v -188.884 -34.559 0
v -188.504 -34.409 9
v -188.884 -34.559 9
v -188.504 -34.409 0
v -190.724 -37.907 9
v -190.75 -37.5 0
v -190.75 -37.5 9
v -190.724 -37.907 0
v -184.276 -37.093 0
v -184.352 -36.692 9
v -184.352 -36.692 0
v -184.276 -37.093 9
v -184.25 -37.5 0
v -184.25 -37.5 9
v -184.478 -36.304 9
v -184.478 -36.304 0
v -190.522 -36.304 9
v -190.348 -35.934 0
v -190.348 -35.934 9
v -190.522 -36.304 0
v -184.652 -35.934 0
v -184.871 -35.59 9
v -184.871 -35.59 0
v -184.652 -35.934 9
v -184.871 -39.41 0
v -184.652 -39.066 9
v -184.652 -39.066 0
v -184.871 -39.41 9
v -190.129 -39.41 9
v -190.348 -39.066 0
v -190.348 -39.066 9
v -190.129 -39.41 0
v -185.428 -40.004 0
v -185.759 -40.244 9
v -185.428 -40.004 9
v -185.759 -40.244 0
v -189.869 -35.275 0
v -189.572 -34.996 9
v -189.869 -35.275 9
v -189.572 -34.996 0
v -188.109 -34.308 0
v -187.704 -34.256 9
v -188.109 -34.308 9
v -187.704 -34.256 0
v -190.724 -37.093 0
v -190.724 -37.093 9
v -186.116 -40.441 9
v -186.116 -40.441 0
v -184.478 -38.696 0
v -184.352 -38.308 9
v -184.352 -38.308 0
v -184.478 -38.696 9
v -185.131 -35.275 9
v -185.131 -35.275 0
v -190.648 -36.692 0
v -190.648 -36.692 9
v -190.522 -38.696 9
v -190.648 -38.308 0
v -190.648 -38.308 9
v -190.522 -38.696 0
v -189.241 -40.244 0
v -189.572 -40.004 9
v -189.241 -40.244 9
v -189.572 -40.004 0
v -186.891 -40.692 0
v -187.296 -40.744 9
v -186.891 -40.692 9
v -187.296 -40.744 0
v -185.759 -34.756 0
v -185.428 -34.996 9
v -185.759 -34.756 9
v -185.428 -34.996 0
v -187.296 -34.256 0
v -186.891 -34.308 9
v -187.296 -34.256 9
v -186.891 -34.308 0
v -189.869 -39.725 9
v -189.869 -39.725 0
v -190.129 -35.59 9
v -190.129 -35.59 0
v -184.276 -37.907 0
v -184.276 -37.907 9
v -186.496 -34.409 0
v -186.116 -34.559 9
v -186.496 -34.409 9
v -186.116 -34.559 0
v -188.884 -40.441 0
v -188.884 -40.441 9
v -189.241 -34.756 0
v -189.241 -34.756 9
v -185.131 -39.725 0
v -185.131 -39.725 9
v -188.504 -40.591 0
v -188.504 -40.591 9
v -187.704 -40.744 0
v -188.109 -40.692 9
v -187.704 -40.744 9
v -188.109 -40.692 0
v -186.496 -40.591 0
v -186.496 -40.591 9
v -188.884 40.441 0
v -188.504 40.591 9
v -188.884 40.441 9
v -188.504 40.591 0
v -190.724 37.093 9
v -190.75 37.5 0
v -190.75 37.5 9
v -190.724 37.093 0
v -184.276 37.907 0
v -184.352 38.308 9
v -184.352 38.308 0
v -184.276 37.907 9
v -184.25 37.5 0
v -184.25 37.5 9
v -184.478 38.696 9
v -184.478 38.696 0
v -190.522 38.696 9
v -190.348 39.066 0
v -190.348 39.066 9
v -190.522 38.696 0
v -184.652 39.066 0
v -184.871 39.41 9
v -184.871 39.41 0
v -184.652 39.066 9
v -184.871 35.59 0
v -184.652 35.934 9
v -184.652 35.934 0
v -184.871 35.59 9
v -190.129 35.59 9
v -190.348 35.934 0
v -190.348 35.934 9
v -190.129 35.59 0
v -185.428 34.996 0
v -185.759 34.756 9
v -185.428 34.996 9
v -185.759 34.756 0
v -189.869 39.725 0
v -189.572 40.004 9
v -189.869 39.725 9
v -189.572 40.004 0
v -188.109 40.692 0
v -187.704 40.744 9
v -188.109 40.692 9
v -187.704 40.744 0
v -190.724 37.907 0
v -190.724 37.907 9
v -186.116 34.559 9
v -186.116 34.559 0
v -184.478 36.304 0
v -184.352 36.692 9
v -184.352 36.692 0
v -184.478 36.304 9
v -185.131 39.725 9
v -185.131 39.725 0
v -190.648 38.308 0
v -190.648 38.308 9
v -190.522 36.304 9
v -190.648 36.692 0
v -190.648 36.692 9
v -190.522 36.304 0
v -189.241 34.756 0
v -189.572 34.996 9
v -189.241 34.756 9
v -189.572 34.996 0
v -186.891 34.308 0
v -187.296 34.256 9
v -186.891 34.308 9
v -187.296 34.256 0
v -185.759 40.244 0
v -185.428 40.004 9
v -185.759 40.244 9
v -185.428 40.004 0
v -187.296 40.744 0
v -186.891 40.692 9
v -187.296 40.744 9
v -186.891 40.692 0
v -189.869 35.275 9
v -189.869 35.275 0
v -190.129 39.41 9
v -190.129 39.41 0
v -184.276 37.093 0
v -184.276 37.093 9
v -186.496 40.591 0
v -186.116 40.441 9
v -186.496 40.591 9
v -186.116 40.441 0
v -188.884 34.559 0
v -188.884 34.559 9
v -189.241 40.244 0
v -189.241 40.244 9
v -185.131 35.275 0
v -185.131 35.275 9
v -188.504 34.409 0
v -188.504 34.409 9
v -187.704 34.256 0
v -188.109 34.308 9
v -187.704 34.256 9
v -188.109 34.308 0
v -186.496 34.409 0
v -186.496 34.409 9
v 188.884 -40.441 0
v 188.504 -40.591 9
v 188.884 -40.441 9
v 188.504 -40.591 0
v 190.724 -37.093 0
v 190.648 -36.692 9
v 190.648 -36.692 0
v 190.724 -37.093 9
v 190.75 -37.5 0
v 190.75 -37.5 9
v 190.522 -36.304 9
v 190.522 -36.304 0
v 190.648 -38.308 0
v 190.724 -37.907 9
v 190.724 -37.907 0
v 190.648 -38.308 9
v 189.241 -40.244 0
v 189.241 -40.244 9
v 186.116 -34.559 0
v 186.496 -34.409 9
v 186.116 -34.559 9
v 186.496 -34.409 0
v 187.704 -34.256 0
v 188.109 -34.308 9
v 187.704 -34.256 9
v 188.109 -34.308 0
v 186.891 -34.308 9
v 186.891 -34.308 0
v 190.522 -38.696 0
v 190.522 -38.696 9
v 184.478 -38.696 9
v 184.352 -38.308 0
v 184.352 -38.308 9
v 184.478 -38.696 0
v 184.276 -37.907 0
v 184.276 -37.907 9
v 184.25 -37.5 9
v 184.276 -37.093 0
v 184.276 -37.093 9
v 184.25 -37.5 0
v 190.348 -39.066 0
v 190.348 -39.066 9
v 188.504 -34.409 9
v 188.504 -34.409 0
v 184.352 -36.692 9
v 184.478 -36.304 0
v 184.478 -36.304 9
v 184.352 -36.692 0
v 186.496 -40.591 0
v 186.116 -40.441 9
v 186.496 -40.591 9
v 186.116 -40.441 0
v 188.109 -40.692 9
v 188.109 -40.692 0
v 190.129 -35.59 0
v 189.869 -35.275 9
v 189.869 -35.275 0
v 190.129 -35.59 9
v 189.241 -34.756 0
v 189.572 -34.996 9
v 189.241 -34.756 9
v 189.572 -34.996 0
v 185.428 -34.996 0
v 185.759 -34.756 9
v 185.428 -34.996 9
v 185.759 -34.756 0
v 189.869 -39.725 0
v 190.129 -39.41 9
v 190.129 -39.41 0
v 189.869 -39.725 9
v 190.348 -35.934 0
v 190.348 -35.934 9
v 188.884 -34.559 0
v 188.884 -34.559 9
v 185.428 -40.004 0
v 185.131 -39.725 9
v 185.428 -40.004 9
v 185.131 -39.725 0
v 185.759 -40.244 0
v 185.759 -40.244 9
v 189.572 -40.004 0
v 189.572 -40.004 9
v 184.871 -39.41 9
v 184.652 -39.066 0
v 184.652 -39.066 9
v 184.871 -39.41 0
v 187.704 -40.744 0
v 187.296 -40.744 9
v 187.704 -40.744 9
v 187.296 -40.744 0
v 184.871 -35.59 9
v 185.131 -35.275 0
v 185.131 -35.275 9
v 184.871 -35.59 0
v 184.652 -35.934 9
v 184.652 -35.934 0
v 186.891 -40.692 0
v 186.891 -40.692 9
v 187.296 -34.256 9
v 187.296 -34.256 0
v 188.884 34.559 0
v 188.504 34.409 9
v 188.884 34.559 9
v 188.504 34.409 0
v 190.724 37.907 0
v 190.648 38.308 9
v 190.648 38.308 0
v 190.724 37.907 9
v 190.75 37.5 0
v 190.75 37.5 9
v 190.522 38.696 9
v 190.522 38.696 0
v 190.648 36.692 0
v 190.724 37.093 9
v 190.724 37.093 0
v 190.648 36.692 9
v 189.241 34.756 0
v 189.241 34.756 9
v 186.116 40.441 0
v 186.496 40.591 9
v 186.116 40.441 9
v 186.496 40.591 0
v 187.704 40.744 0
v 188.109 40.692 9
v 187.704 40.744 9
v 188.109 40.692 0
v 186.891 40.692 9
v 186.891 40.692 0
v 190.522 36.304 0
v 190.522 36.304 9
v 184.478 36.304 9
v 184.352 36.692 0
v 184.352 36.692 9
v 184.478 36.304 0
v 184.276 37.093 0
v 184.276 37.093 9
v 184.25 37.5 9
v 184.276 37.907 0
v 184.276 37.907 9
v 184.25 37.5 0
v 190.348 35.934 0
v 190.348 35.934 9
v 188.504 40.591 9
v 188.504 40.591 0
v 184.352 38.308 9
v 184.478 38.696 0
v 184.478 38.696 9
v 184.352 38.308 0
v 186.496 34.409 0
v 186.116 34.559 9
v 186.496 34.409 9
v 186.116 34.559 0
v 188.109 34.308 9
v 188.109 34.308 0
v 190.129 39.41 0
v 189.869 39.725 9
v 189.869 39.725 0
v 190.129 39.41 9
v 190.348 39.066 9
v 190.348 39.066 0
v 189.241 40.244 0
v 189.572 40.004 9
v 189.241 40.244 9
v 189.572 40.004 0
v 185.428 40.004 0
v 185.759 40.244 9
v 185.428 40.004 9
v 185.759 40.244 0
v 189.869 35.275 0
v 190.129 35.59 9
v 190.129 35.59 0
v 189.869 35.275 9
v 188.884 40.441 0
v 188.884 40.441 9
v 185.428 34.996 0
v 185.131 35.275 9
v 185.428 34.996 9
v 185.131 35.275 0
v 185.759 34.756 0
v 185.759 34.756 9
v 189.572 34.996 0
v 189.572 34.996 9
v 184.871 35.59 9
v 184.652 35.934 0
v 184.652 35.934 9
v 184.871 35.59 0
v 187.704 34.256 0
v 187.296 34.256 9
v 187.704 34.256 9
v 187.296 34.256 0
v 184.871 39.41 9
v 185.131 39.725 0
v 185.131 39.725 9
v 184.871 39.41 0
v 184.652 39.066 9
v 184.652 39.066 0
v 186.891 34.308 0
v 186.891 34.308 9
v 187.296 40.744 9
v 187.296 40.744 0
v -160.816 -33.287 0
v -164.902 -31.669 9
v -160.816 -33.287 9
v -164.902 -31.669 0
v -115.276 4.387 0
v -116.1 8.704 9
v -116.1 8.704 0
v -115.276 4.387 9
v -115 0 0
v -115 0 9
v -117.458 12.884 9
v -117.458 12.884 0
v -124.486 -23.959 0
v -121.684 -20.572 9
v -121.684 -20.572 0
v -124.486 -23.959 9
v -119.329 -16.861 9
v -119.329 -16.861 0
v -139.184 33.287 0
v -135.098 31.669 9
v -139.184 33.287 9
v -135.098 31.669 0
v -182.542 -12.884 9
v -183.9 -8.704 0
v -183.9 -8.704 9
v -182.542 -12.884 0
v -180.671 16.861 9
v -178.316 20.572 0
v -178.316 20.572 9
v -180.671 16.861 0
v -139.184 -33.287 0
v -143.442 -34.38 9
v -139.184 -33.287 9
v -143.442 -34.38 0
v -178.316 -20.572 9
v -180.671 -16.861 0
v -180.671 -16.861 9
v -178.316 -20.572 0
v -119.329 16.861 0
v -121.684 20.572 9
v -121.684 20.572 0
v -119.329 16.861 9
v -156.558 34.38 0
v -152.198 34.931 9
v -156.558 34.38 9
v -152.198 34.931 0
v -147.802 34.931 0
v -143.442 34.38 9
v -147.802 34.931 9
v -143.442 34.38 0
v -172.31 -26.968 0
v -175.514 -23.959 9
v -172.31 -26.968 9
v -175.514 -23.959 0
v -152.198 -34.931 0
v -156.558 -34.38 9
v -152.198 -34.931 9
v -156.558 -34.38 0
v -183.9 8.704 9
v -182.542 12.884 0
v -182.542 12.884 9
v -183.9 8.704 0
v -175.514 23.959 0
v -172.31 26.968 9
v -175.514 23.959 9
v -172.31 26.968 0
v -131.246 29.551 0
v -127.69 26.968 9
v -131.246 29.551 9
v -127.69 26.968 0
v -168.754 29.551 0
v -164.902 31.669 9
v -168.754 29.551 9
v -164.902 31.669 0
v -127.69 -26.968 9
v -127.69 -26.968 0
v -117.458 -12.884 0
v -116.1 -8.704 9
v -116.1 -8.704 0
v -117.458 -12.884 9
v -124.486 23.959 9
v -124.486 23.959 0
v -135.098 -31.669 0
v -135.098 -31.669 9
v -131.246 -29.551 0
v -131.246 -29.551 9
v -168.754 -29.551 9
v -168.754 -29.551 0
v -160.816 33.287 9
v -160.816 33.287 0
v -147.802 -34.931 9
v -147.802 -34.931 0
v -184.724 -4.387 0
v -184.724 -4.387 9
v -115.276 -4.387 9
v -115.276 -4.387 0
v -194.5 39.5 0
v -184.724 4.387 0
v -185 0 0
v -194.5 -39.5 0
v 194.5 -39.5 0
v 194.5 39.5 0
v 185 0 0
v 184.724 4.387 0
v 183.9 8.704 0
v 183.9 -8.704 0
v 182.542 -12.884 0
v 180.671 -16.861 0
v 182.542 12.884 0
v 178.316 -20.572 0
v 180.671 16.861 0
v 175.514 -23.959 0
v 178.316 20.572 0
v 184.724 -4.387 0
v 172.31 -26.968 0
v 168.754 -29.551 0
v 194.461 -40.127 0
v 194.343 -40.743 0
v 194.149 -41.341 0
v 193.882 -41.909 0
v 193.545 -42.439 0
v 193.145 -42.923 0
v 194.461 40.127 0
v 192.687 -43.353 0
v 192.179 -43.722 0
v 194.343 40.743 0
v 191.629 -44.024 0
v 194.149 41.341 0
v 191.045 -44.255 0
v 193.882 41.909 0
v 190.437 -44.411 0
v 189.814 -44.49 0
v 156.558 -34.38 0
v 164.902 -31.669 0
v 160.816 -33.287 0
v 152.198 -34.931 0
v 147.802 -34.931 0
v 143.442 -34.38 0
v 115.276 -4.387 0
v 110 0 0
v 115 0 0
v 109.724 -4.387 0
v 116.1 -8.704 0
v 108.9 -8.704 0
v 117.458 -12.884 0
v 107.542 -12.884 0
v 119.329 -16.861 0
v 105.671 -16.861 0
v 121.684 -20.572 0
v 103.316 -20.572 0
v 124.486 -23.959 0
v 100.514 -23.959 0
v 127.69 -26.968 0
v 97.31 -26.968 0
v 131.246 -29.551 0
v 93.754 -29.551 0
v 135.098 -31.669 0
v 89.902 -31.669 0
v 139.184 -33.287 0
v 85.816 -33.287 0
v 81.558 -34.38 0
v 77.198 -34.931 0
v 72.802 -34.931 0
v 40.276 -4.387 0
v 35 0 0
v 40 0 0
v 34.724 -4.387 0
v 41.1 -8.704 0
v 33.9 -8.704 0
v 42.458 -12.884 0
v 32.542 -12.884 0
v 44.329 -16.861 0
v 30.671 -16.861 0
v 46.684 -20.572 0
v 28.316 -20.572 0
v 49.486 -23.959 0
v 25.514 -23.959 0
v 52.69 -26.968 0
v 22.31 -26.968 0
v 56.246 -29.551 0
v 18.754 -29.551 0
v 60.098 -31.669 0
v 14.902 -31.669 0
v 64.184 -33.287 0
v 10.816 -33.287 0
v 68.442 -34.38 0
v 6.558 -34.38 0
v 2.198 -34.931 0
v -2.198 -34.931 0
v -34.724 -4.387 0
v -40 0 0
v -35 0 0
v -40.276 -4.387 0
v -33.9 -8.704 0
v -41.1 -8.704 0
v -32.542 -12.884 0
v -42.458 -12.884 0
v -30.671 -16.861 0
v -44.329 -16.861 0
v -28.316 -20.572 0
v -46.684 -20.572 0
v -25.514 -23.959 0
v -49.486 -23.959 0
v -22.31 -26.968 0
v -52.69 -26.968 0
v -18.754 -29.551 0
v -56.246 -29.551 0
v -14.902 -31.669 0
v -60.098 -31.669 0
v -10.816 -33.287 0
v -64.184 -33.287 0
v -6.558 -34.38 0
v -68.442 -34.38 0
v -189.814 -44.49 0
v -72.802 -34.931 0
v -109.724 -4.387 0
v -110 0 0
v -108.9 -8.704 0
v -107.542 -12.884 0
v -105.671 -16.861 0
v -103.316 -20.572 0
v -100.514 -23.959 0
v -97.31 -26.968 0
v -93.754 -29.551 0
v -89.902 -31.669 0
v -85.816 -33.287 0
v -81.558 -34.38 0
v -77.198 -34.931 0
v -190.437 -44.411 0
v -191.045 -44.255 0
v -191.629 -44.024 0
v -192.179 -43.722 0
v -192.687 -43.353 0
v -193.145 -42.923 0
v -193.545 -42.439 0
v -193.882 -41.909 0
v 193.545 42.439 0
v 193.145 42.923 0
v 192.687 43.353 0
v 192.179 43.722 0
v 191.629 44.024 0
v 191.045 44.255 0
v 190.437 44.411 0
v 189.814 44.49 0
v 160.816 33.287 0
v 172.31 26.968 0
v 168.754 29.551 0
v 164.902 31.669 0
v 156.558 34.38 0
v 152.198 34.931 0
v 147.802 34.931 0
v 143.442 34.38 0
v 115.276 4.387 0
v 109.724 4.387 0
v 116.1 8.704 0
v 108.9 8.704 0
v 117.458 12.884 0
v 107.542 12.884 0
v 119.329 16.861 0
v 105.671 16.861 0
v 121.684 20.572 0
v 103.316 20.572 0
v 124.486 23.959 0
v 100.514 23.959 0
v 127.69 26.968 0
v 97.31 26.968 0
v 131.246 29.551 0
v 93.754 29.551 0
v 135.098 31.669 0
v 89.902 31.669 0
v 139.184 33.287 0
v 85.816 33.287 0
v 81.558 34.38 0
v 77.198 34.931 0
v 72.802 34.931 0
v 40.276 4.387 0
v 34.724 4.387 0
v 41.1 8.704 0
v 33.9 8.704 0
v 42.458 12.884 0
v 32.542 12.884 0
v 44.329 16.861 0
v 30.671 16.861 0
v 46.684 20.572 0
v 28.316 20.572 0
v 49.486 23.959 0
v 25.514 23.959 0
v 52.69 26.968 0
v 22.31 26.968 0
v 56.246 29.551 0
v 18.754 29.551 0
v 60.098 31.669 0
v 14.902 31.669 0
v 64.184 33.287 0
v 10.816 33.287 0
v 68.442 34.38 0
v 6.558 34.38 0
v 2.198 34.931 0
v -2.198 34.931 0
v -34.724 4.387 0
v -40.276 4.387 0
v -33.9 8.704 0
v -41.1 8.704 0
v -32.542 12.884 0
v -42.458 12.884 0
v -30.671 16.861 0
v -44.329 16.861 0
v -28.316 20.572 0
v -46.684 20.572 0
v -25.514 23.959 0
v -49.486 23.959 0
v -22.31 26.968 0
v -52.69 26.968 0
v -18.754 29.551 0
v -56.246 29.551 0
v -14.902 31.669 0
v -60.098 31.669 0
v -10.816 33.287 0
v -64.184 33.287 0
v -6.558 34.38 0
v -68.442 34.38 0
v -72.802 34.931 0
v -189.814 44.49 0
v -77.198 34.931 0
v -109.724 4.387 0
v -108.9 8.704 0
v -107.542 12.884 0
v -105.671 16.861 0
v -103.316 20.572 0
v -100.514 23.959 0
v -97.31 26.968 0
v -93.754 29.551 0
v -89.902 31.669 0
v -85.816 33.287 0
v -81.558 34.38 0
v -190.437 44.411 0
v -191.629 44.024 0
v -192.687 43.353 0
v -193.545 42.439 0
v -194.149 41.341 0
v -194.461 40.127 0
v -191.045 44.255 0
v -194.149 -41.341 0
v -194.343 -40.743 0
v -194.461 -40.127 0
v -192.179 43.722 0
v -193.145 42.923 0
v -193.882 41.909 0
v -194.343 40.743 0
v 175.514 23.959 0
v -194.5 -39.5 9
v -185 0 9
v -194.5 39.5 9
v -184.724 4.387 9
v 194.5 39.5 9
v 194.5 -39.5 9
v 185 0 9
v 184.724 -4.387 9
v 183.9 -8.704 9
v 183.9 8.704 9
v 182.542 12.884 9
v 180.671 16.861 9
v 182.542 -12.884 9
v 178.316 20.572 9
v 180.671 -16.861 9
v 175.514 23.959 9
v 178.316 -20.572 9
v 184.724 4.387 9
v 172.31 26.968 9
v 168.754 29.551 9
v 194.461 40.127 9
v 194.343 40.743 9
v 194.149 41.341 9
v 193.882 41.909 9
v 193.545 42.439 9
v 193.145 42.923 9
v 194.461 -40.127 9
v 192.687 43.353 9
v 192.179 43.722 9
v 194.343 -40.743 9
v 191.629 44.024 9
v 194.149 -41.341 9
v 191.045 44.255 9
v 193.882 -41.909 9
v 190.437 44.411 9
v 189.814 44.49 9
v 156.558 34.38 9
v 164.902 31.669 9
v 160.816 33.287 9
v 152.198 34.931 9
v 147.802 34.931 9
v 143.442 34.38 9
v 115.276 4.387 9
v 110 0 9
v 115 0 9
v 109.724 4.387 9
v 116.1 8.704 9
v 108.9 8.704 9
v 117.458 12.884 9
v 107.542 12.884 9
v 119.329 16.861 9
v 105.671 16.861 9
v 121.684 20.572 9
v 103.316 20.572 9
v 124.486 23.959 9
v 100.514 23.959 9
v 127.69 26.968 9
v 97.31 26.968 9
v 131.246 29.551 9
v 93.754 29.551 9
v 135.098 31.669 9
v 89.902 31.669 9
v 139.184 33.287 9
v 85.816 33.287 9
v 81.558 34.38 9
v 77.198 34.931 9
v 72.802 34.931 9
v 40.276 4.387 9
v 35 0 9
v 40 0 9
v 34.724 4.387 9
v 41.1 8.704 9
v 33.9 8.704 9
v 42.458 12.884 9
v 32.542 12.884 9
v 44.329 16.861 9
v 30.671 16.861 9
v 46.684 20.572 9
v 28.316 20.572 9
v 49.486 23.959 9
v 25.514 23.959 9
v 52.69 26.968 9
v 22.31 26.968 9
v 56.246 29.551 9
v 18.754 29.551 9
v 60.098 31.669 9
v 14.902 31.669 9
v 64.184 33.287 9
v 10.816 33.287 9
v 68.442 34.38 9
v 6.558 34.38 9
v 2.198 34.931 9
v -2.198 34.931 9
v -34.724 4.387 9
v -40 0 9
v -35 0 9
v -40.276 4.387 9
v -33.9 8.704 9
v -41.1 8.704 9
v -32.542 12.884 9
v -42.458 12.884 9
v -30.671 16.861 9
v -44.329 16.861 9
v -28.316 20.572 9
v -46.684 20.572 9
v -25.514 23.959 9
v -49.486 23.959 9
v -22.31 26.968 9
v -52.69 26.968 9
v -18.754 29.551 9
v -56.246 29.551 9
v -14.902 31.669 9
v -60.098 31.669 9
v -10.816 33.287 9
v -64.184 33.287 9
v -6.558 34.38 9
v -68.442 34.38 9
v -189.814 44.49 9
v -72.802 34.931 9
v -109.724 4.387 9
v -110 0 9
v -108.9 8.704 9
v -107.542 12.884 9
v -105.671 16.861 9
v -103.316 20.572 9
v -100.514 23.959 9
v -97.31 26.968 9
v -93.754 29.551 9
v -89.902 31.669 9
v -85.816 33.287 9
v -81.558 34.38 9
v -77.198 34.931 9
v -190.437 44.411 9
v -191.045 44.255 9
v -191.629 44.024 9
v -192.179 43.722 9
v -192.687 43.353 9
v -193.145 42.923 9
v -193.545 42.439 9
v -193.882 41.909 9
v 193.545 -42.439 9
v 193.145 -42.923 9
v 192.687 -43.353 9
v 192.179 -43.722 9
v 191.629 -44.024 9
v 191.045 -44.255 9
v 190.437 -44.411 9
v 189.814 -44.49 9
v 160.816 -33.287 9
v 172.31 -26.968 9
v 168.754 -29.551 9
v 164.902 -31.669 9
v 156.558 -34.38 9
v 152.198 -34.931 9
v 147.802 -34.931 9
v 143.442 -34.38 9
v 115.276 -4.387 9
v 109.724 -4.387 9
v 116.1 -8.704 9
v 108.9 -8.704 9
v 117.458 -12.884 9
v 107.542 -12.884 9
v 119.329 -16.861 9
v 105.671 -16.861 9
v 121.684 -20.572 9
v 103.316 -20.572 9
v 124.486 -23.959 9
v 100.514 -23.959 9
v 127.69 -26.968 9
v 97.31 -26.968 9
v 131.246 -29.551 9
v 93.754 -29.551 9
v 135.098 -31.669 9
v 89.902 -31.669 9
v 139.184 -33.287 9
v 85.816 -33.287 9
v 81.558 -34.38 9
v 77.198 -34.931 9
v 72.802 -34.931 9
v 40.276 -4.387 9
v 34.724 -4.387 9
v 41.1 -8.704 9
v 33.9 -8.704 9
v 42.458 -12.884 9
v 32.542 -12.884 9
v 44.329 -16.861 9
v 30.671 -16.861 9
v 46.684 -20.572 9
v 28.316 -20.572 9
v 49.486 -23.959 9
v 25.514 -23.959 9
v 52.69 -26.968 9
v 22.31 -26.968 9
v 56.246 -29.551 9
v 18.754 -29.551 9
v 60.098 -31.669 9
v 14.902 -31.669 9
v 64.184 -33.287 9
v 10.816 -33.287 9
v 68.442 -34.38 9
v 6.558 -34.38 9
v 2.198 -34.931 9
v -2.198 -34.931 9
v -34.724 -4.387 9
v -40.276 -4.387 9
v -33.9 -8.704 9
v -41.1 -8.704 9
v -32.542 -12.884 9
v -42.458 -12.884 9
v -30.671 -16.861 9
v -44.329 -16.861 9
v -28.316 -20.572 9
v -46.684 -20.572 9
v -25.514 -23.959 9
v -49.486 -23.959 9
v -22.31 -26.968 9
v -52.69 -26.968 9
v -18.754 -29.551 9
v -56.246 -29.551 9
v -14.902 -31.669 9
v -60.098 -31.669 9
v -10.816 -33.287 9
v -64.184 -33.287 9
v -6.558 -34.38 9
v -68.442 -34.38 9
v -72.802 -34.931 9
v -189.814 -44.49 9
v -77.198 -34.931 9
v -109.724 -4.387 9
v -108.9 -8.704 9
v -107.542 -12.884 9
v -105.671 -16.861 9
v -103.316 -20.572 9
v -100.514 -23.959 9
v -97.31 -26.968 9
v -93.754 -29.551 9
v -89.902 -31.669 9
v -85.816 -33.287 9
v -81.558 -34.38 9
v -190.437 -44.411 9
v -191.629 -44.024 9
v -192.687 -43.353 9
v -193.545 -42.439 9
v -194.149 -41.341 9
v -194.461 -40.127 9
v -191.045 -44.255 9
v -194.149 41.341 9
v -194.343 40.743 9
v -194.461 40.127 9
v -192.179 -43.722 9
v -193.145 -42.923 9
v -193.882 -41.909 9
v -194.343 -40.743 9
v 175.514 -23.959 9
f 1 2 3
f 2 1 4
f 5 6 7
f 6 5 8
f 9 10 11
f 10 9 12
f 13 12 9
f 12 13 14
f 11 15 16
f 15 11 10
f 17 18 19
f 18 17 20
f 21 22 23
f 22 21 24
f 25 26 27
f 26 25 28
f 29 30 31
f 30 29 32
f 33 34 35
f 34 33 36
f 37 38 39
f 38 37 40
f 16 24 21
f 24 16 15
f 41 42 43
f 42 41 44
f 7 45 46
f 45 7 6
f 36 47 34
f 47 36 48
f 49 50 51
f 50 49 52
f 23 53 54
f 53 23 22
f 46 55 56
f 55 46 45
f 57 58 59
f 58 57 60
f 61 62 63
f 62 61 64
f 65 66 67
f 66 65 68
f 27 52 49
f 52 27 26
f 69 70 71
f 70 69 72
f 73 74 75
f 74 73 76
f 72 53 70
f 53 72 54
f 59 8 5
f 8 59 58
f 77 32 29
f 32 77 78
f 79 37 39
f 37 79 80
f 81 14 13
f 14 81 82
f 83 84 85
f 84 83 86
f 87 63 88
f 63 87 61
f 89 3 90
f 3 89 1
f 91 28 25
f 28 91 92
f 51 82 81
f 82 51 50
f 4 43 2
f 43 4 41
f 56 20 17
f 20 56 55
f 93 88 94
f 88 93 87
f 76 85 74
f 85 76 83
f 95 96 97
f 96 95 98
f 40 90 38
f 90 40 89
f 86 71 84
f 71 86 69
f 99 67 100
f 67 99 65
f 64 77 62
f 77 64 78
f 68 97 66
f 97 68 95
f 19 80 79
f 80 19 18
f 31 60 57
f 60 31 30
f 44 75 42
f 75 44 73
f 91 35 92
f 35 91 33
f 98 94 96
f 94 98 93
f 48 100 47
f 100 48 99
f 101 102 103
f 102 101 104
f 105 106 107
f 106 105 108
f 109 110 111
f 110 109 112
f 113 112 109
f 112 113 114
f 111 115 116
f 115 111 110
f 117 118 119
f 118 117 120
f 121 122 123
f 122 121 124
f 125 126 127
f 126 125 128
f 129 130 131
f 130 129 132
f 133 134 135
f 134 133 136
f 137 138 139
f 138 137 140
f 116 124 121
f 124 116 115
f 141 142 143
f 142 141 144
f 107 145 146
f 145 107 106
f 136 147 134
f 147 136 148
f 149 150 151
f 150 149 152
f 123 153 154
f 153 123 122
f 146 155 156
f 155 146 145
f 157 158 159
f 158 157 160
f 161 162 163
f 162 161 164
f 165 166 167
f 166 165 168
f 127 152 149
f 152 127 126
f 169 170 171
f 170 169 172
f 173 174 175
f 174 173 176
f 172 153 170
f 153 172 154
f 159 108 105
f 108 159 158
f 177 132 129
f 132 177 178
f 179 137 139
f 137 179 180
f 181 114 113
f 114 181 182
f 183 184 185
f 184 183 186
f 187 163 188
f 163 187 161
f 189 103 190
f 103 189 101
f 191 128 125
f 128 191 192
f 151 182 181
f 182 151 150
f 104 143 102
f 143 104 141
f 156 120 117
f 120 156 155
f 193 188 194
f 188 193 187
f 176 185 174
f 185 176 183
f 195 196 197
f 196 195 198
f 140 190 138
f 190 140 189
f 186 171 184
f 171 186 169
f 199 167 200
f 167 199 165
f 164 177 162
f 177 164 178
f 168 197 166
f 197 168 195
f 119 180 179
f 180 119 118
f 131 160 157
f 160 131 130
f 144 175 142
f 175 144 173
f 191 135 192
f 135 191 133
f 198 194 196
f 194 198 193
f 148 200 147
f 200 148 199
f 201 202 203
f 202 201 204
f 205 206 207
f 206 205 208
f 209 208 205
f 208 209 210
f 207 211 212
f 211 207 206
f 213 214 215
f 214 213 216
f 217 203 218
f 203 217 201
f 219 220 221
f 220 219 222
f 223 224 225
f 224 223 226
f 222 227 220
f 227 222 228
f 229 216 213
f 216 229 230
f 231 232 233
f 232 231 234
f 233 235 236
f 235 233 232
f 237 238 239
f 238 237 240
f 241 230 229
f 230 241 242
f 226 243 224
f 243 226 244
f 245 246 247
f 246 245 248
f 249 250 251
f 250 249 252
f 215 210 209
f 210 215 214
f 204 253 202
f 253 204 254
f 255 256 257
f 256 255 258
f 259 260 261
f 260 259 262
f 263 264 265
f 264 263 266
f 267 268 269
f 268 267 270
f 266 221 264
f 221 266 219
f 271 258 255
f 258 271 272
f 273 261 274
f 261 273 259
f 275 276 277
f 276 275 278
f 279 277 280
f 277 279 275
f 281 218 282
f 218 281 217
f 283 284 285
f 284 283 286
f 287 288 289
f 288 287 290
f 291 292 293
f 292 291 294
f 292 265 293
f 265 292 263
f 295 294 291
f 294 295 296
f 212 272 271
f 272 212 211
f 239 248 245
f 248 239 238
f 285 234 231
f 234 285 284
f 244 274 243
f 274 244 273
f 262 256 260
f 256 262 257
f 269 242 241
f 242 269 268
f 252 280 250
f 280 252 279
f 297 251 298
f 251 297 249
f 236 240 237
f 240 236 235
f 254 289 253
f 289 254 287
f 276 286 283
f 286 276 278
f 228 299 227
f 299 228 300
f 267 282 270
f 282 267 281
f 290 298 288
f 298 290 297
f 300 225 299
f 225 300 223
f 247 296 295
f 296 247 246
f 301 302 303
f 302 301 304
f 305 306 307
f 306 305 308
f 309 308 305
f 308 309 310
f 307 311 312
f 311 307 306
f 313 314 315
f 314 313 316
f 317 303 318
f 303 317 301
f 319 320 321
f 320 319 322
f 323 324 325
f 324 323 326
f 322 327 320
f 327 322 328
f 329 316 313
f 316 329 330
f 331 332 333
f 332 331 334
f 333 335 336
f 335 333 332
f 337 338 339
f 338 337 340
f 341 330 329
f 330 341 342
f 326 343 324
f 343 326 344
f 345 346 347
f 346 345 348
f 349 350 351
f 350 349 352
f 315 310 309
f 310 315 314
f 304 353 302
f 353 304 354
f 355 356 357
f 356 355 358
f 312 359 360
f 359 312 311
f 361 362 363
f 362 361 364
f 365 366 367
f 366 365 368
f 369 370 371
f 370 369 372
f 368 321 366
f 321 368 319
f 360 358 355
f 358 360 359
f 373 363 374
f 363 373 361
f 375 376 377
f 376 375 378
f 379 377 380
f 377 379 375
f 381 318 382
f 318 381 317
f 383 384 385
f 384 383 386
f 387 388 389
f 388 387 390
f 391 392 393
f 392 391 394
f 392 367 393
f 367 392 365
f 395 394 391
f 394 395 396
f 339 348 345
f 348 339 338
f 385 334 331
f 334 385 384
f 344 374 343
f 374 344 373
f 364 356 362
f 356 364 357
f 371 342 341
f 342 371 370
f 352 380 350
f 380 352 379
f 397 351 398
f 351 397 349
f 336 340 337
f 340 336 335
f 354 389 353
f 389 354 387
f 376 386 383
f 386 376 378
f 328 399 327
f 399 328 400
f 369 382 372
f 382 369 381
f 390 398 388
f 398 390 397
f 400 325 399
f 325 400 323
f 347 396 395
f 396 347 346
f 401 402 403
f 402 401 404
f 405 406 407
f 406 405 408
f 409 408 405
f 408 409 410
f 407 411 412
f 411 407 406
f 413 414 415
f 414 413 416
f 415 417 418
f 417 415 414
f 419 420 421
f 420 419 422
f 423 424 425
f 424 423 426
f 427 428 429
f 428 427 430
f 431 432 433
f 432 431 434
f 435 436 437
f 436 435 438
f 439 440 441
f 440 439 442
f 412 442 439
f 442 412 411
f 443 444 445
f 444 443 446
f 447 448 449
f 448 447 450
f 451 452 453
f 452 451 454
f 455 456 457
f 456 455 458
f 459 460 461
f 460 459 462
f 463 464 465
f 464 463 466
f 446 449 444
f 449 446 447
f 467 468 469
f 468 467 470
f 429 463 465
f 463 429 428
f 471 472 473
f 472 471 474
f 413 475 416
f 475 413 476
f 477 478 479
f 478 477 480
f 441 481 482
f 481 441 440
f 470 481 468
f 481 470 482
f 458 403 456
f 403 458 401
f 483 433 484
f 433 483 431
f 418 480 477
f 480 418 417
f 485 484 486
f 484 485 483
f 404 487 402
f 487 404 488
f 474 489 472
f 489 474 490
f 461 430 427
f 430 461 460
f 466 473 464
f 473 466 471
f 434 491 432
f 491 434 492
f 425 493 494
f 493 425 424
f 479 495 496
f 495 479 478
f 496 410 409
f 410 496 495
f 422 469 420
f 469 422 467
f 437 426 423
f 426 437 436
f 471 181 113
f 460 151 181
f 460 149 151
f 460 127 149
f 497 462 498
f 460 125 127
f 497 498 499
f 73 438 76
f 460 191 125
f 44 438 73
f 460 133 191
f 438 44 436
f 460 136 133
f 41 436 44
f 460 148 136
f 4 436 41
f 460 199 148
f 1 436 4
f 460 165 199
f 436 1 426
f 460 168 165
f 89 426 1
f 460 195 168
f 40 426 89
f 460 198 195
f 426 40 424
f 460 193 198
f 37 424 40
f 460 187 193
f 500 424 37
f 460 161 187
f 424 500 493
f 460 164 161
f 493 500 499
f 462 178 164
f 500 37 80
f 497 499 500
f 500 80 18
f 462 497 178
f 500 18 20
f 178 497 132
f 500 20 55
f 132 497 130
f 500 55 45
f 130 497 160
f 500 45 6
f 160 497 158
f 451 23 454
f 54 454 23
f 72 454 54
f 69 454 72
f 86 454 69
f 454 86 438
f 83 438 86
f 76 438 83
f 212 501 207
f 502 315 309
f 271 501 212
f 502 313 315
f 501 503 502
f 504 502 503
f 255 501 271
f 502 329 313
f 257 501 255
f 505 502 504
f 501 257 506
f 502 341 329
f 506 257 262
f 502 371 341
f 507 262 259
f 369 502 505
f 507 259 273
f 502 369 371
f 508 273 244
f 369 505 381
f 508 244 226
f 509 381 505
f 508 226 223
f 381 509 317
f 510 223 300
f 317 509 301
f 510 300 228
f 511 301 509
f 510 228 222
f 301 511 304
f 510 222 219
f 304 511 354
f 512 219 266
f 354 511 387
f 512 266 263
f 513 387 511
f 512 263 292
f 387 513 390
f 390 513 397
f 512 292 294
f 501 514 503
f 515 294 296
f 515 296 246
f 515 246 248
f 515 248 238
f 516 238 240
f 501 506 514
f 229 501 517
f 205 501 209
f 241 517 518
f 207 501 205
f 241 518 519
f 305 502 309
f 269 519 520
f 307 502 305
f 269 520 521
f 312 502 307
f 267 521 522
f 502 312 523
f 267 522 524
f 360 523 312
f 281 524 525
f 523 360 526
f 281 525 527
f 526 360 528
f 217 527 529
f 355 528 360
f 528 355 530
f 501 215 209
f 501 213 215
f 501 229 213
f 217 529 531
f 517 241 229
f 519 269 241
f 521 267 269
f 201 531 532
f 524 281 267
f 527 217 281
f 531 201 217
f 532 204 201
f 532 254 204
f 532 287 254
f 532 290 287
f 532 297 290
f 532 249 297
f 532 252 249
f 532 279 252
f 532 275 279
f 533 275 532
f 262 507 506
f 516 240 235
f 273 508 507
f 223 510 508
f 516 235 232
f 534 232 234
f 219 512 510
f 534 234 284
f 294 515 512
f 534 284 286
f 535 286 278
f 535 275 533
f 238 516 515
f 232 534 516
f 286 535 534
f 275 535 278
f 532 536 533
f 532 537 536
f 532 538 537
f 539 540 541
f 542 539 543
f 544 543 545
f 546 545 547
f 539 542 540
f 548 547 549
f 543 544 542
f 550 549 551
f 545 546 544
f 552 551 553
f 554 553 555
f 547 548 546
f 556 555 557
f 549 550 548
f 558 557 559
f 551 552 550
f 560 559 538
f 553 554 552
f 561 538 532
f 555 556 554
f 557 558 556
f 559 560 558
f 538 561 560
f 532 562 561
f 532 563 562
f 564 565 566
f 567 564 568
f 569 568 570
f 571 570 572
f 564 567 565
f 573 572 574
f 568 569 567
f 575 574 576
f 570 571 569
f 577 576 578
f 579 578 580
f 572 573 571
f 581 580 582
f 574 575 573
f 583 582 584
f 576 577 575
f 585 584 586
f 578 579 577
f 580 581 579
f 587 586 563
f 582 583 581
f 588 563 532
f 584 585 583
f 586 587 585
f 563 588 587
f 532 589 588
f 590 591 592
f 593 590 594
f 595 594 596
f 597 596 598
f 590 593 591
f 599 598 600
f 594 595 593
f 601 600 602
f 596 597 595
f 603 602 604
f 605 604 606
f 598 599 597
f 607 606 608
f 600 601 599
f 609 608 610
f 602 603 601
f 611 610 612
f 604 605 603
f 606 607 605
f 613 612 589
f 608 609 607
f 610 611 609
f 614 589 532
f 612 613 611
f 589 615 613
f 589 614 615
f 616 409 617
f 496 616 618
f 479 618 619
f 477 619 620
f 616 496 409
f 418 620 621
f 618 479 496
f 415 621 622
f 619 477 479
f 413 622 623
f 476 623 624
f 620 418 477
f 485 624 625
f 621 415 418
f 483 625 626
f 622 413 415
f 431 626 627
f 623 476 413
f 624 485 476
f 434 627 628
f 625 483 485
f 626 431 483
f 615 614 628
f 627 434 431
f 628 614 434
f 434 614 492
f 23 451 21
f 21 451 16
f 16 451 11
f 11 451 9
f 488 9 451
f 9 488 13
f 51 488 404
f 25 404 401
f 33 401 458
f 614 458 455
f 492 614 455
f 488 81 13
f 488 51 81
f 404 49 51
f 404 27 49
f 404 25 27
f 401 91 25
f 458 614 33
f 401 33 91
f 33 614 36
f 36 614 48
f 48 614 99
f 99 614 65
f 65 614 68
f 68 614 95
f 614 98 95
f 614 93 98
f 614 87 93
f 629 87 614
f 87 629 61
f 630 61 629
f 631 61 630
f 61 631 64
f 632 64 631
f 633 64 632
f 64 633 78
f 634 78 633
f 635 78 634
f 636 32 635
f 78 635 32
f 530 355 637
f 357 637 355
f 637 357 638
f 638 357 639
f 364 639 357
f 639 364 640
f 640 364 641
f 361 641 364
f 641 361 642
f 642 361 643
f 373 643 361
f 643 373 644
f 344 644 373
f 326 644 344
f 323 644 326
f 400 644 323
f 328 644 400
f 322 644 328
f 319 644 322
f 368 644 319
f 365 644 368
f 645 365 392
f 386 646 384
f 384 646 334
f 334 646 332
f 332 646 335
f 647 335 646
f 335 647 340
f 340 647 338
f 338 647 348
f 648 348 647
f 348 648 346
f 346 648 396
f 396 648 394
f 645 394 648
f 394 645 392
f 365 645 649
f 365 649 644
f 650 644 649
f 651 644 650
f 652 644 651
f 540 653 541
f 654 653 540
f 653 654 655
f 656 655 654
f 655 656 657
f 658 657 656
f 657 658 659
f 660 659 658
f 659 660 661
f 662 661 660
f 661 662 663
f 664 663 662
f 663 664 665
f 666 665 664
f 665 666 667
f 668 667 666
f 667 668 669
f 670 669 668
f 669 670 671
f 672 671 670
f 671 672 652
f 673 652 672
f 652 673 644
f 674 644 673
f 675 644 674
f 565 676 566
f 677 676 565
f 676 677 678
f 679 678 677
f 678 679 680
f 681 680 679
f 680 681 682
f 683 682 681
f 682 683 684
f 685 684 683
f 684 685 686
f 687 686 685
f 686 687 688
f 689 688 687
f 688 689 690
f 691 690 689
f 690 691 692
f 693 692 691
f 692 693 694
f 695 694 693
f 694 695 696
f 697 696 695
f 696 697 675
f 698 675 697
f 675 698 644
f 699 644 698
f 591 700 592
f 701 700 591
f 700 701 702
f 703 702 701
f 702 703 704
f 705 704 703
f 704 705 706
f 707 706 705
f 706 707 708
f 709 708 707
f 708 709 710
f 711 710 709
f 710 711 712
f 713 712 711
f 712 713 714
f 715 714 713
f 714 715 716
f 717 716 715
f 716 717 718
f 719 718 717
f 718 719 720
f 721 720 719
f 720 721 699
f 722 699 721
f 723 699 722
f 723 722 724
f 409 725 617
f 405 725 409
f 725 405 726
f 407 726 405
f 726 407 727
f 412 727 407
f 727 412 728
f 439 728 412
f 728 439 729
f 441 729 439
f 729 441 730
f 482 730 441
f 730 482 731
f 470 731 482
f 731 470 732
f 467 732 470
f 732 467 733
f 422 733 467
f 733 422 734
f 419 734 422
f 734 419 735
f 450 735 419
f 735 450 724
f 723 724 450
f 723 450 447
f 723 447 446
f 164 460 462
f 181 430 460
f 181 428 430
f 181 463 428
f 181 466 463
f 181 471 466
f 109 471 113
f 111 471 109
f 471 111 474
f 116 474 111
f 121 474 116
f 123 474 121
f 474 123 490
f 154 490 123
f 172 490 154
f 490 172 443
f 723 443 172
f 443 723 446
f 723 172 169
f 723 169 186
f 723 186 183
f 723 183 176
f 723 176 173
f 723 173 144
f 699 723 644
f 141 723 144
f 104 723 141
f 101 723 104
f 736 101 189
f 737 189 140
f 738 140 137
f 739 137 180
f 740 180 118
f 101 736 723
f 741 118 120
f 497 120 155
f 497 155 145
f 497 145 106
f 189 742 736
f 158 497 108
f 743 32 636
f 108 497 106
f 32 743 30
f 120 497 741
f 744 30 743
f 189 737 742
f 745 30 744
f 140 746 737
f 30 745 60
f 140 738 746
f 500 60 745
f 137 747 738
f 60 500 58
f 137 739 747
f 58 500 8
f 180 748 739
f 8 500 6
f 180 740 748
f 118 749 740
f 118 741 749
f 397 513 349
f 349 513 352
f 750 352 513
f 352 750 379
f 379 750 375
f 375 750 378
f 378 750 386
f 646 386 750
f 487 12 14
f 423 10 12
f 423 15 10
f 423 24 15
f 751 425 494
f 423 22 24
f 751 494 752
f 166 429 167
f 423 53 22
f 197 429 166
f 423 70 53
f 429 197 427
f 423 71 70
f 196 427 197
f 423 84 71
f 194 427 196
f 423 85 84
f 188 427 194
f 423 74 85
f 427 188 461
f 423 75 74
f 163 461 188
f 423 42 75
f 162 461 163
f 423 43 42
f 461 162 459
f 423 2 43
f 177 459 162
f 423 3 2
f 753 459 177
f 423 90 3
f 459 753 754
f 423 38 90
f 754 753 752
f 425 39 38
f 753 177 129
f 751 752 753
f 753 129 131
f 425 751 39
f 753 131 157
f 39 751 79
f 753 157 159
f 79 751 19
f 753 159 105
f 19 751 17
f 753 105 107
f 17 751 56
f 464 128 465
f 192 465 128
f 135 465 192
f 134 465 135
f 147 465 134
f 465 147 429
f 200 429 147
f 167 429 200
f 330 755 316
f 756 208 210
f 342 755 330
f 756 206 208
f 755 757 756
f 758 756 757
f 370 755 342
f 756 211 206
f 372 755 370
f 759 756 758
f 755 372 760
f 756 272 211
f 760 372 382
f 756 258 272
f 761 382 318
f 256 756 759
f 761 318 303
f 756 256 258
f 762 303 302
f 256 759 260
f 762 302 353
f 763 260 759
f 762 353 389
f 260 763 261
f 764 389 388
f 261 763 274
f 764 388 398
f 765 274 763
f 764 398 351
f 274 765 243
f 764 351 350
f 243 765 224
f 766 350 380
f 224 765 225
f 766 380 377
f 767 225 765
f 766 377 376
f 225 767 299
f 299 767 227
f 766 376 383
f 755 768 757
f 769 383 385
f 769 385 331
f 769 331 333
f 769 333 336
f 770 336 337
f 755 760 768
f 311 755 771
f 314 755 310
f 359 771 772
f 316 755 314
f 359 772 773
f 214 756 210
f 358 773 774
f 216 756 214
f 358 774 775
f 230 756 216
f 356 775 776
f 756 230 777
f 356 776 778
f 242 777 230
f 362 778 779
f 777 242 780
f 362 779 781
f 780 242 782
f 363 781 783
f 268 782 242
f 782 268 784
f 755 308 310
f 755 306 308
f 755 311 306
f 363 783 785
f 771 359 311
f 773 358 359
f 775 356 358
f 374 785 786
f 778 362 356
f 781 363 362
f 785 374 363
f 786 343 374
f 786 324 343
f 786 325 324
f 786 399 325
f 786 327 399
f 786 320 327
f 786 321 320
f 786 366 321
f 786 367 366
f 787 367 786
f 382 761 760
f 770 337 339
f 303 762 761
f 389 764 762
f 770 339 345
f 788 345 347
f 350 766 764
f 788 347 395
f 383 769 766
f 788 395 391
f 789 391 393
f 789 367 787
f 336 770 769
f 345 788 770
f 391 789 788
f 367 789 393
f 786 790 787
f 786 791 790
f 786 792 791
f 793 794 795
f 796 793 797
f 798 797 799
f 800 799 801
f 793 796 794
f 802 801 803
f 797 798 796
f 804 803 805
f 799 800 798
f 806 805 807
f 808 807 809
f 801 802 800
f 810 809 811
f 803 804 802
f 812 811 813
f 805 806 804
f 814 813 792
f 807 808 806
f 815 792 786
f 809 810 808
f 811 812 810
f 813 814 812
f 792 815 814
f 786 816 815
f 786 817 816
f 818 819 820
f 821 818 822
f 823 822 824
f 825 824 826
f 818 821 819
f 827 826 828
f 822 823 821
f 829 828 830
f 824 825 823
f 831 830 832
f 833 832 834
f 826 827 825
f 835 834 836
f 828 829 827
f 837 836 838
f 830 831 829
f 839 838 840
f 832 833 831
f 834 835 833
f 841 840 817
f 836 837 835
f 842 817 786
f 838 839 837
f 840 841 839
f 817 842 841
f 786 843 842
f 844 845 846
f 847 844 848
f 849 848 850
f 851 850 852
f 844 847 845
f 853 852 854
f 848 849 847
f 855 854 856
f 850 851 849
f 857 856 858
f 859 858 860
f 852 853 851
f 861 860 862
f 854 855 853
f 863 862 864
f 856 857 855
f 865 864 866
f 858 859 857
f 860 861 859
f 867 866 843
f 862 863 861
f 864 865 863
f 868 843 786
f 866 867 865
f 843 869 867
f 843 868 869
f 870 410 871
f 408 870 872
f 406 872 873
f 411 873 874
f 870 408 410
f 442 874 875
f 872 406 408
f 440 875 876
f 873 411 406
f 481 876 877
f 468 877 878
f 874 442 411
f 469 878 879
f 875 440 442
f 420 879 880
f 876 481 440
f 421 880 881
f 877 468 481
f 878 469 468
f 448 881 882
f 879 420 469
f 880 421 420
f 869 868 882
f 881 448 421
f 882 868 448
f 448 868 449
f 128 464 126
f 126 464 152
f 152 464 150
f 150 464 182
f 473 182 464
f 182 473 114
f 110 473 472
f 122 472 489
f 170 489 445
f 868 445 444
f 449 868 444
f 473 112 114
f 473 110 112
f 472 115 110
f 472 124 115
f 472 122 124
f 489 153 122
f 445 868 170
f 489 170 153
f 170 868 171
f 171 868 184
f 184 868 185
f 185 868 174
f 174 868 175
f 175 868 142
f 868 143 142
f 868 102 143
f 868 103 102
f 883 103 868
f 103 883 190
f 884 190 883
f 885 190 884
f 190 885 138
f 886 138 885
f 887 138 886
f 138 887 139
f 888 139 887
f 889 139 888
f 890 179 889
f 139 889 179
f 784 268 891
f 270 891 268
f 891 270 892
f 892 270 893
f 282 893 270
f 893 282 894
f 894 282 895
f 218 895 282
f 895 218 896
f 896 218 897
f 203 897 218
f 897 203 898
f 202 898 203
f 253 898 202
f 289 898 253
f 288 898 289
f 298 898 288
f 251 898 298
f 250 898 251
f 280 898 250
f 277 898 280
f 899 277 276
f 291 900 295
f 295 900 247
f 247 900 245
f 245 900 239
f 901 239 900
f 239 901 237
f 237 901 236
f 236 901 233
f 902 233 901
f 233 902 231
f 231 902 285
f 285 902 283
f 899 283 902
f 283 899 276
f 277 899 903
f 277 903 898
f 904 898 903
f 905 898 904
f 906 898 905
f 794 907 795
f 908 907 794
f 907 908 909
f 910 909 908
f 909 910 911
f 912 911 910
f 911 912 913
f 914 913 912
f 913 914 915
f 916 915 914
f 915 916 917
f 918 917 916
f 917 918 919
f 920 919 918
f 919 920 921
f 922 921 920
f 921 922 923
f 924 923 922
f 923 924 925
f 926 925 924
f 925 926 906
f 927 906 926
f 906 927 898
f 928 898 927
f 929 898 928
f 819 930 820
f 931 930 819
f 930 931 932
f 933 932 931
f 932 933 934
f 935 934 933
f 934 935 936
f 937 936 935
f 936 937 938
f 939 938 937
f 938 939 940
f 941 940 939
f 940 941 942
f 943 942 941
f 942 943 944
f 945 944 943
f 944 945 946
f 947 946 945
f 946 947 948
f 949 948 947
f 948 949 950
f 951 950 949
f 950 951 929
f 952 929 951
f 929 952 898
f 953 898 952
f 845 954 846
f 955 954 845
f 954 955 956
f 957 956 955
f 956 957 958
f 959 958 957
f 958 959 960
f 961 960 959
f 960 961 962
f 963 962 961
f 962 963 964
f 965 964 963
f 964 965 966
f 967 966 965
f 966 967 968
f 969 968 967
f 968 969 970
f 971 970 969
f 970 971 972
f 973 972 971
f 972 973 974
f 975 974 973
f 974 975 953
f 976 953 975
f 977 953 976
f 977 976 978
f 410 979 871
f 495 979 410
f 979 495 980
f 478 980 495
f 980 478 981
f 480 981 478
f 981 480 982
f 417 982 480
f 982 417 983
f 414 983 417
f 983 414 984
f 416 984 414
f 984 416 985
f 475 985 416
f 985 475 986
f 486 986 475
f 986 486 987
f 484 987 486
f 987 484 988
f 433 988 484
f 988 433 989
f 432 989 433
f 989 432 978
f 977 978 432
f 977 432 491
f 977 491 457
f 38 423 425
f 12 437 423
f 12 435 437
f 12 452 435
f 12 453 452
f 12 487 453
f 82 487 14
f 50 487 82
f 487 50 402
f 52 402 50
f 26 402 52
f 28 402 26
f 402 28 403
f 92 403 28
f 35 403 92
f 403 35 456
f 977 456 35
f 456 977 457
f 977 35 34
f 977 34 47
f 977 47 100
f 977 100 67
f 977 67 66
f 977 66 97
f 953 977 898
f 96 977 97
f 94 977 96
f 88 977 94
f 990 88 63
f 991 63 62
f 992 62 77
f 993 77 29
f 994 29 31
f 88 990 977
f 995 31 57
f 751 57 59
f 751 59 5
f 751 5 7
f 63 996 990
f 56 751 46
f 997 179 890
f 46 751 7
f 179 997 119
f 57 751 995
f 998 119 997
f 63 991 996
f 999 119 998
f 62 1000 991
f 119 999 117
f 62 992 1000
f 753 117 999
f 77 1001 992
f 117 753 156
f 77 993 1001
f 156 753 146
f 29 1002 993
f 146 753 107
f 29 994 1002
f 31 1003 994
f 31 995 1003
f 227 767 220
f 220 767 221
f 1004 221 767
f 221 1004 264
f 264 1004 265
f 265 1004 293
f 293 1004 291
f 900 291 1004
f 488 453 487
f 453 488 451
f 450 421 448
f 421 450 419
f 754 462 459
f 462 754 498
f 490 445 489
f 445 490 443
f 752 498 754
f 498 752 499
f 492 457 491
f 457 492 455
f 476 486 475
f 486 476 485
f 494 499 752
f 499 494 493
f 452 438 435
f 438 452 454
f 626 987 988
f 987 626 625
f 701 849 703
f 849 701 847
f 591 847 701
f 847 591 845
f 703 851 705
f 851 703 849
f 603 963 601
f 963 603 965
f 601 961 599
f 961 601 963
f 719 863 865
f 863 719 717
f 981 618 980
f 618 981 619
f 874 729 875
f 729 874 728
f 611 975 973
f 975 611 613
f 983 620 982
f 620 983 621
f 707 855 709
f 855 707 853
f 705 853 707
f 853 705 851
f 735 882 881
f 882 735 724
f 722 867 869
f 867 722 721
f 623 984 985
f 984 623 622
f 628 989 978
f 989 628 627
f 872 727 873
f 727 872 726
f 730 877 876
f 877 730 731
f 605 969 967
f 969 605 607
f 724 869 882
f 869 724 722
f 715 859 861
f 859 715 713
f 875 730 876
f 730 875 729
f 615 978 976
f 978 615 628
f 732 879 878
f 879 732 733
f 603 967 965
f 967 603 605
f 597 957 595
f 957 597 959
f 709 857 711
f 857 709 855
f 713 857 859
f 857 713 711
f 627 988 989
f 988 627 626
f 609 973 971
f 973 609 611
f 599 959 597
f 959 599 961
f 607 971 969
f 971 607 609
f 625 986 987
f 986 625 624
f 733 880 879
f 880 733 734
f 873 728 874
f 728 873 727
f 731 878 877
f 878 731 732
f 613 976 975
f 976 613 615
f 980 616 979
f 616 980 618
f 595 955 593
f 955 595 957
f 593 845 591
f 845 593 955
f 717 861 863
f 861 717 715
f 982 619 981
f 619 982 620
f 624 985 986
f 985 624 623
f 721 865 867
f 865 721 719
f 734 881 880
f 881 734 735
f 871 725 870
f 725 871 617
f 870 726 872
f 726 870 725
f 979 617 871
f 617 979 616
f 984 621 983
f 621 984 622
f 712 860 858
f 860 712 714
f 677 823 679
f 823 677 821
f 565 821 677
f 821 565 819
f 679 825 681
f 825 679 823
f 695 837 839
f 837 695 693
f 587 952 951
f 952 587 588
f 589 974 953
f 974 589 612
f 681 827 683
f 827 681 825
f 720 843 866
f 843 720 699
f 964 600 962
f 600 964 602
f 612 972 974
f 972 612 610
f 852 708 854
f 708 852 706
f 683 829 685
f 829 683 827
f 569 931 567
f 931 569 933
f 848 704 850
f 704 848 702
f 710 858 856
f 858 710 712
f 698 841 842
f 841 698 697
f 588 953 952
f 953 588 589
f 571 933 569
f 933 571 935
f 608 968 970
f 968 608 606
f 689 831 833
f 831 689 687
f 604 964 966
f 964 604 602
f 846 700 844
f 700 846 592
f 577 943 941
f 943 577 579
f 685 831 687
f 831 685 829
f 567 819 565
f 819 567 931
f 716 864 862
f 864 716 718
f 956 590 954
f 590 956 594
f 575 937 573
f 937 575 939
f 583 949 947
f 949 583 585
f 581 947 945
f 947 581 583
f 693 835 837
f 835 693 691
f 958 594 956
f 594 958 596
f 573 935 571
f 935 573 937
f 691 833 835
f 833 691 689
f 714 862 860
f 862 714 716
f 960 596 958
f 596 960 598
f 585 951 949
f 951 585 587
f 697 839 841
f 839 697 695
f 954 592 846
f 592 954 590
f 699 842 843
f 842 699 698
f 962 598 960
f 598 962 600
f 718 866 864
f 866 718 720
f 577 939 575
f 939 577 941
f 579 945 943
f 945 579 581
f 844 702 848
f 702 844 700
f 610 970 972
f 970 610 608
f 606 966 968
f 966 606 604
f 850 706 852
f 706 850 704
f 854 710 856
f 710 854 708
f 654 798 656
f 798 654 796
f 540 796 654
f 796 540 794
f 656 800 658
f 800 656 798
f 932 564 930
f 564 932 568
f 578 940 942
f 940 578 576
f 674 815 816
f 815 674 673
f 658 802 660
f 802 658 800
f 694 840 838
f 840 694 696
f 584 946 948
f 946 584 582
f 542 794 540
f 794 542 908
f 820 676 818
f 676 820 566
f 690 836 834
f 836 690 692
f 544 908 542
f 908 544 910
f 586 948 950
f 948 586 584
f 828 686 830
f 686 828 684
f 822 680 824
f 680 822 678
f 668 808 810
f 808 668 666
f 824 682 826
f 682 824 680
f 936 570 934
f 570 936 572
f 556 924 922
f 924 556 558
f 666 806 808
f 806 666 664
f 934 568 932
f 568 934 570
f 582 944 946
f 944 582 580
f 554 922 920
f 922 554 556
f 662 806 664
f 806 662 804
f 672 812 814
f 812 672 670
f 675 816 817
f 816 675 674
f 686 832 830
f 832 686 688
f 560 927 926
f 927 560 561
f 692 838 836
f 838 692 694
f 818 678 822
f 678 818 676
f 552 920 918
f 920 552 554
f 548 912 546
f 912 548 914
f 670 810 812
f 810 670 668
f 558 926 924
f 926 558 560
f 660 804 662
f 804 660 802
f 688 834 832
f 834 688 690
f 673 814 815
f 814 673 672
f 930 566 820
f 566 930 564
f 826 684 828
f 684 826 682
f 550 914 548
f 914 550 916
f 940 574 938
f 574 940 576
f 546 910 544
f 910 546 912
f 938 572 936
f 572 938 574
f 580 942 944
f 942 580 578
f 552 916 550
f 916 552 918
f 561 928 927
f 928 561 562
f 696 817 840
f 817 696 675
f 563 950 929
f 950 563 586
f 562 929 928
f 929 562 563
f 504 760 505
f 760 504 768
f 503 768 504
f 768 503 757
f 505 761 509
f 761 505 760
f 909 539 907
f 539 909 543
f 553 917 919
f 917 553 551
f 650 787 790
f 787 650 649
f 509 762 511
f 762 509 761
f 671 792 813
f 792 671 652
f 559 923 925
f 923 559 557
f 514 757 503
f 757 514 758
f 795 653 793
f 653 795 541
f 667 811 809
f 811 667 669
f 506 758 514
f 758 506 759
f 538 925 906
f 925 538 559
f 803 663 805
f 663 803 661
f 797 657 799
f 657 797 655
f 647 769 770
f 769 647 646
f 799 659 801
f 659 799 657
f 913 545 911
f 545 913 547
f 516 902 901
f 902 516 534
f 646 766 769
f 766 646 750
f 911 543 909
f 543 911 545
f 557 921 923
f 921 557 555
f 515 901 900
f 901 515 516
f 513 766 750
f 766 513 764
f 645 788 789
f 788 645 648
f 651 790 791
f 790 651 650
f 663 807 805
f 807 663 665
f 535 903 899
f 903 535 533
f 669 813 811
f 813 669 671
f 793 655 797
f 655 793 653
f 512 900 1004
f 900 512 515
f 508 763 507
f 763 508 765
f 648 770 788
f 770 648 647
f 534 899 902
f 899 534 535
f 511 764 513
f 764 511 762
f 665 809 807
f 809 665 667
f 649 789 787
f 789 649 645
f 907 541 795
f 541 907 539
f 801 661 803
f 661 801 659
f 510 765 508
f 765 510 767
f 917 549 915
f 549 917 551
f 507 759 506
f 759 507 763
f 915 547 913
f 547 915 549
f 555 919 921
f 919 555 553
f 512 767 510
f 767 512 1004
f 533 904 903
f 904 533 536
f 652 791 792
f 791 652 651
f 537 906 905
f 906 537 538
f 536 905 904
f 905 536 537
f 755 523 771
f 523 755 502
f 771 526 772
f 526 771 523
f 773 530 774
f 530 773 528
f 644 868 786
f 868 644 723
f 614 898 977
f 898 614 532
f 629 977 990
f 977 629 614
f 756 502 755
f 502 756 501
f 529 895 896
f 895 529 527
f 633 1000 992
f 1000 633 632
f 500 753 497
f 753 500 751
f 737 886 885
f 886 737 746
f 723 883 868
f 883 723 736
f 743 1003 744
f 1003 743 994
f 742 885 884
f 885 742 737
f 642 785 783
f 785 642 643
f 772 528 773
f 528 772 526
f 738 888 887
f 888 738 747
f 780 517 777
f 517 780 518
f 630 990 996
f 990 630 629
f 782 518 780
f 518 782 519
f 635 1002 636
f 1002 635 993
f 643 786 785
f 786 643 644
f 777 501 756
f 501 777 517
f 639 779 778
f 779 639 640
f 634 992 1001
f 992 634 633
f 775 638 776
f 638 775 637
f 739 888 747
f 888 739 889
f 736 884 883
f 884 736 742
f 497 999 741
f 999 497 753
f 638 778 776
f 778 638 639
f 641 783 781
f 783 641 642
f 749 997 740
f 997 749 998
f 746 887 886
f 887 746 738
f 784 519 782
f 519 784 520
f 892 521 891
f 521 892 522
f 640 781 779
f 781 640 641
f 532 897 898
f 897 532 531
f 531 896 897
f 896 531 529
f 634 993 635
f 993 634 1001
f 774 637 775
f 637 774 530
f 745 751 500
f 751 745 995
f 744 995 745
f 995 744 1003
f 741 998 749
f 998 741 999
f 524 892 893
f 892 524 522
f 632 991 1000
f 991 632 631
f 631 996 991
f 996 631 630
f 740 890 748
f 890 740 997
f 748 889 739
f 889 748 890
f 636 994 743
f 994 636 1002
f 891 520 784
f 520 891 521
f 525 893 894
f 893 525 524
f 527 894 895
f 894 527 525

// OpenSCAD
$fn = 50;


difference() {
	union() {
		hull() {
			translate(v = [-189.5000000000, 39.5000000000, 0]) {
				cylinder(h = 9, r = 5);
			}
			translate(v = [189.5000000000, 39.5000000000, 0]) {
				cylinder(h = 9, r = 5);
			}
			translate(v = [-189.5000000000, -39.5000000000, 0]) {
				cylinder(h = 9, r = 5);
			}
			translate(v = [189.5000000000, -39.5000000000, 0]) {
				cylinder(h = 9, r = 5);
			}
		}
	}
	union() {
		#translate(v = [-187.5000000000, -37.5000000000, -100.0000000000]) {
			cylinder(h = 200, r = 3.2500000000);
		}
		#translate(v = [-187.5000000000, 37.5000000000, -100.0000000000]) {
			cylinder(h = 200, r = 3.2500000000);
		}
		#translate(v = [187.5000000000, -37.5000000000, -100.0000000000]) {
			cylinder(h = 200, r = 3.2500000000);
		}
		#translate(v = [187.5000000000, 37.5000000000, -100.0000000000]) {
			cylinder(h = 200, r = 3.2500000000);
		}
		#translate(v = [-150.0000000000, 0, 0]) {
			cylinder(h = 9, r = 35.0000000000);
		}
		#translate(v = [-75.0000000000, 0, 0]) {
			cylinder(h = 9, r = 35.0000000000);
		}
		#cylinder(h = 9, r = 35.0000000000);
		#translate(v = [75.0000000000, 0, 0]) {
			cylinder(h = 9, r = 35.0000000000);
		}
		#translate(v = [150.0000000000, 0, 0]) {
			cylinder(h = 9, r = 35.0000000000);
		}
	}
}
